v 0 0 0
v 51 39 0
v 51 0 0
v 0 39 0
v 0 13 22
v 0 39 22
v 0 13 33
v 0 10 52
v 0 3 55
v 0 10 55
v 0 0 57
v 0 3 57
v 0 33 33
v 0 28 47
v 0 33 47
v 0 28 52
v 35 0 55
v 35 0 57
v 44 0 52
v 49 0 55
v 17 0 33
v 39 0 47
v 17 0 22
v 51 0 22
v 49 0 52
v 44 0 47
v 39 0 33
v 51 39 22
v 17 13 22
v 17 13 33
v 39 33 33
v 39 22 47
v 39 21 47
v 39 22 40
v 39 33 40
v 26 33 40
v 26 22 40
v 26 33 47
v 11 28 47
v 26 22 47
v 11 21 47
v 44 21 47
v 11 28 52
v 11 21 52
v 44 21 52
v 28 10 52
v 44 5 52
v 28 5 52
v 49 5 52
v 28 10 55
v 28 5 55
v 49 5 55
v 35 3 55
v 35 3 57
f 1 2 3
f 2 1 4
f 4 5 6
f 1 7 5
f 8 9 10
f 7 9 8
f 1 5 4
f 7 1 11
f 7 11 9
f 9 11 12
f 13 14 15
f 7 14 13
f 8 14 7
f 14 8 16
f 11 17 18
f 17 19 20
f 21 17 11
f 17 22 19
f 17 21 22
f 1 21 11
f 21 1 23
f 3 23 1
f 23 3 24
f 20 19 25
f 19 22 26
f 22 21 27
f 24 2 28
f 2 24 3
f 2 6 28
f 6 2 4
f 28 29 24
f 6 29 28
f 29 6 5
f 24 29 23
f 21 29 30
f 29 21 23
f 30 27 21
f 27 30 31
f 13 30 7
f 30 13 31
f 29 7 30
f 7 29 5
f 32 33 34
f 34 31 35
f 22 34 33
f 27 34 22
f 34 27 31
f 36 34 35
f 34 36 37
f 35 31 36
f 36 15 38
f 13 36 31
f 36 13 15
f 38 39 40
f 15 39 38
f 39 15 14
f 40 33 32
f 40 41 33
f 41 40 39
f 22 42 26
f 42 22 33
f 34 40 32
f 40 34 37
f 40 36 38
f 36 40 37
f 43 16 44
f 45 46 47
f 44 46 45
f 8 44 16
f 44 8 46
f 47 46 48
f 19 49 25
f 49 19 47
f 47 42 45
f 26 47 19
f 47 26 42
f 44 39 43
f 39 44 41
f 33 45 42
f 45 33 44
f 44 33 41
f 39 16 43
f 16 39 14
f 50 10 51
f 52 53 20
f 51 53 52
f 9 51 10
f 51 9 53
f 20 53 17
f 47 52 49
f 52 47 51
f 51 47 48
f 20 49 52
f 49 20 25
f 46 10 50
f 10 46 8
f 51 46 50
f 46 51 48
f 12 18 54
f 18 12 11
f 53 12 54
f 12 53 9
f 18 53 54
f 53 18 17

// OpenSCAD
translate([8.5, 6.5, 5.5]) color([0.7181316517768294, 0.8070553799750758, 0.06635913103778524]) cube([17, 13, 11], center=true);
translate([25.5, 6.5, 5.5]) color([0.08464313683307012, 0.8688953140043785, 0.03941582937802879]) cube([17, 13, 11], center=true);
translate([42.5, 6.5, 5.5]) color([0.22509065367649606, 0.04063202664590093, 0.015285139969726802]) cube([17, 13, 11], center=true);
translate([8.5, 19.5, 5.5]) color([0.8439546856924078, 0.3305943672500803, 0.1606900602627206]) cube([17, 13, 11], center=true);
translate([25.5, 19.5, 5.5]) color([0.1488194902889095, 0.656083661770337, 0.9685982716927071]) cube([17, 13, 11], center=true);
translate([42.5, 19.5, 5.5]) color([0.5049996926056783, 0.9010904768840049, 0.5024285989524275]) cube([17, 13, 11], center=true);
translate([8.5, 32.5, 5.5]) color([0.5738724774915492, 0.6785713567893591, 0.805109989032137]) cube([17, 13, 11], center=true);
translate([25.5, 32.5, 5.5]) color([0.7578463822613826, 0.9905325627055622, 0.7469653891501328]) cube([17, 13, 11], center=true);
translate([42.5, 32.5, 5.5]) color([0.9057807233528663, 0.20610483206558328, 0.535416304328581]) cube([17, 13, 11], center=true);
translate([8.5, 6.5, 16.5]) color([0.5986142636674691, 0.8256966171603538, 0.4822135630659161]) cube([17, 13, 11], center=true);
translate([25.5, 6.5, 16.5]) color([0.7910402117090956, 0.3885688901501142, 0.5863884555814496]) cube([17, 13, 11], center=true);
translate([42.5, 6.5, 16.5]) color([0.8513166074810679, 0.7980594711041583, 0.6569845518861341]) cube([17, 13, 11], center=true);
translate([8.5, 19.5, 16.5]) color([0.00024069652516689466, 0.18196892218621108, 0.5068577868511277]) cube([17, 13, 11], center=true);
translate([25.5, 19.5, 16.5]) color([0.2544593984833793, 0.06562084327273077, 0.8598834221214616]) cube([17, 13, 11], center=true);
translate([42.5, 19.5, 16.5]) color([0.9429470213131631, 0.3028048781490337, 0.40807316738486077]) cube([17, 13, 11], center=true);
translate([8.5, 32.5, 16.5]) color([0.8100375338172869, 0.06225875887122312, 0.6409848625624502]) cube([17, 13, 11], center=true);
translate([25.5, 32.5, 16.5]) color([0.12732081293278708, 0.2870883399952252, 0.829940686628406]) cube([17, 13, 11], center=true);
translate([42.5, 32.5, 16.5]) color([0.0555270458896614, 0.035933833430188966, 0.4178660447962945]) cube([17, 13, 11], center=true);
translate([8.5, 6.5, 27.5]) color([0.49183095909626395, 0.8633251831082008, 0.7171887463451895]) cube([17, 13, 11], center=true);
translate([6.5, 5.5, 36.5]) color([0.6735438085995347, 0.15137377239978678, 0.9867059242186832]) cube([13, 11, 7], center=true);
translate([19.5, 5.5, 36.5]) color([0.41114019628748133, 0.6117708643248599, 0.38668300553323576]) cube([13, 11, 7], center=true);
translate([32.5, 5.5, 36.5]) color([0.04703291581184044, 0.4708892090480652, 0.15136775389483625]) cube([13, 11, 7], center=true);
translate([6.5, 16.5, 36.5]) color([0.03246546237394399, 0.6174004236810055, 0.6299662912183356]) cube([13, 11, 7], center=true);
translate([19.5, 16.5, 36.5]) color([0.10529282465636491, 0.5491437662317772, 0.3466679766399683]) cube([13, 11, 7], center=true);
translate([32.5, 16.5, 36.5]) color([0.3834140731648874, 0.7764198986996783, 0.49031967752424566]) cube([13, 11, 7], center=true);
translate([6.5, 27.5, 36.5]) color([0.8812766154122413, 0.6101197429062234, 0.4671884150380703]) cube([13, 11, 7], center=true);
translate([19.5, 27.5, 36.5]) color([0.6323126400553846, 0.3378653798287524, 0.12432379252825243]) cube([13, 11, 7], center=true);
translate([32.5, 27.5, 36.5]) color([0.6825296186925238, 0.622037442746657, 0.7885664913738635]) cube([13, 11, 7], center=true);
translate([6.5, 5.5, 43.5]) color([0.1271091249471088, 0.9117833181295222, 0.799341211421814]) cube([13, 11, 7], center=true);
translate([19.5, 5.5, 43.5]) color([0.9168874080910093, 0.8725347217734669, 0.681006446357057]) cube([13, 11, 7], center=true);
translate([32.5, 5.5, 43.5]) color([0.8102508494373589, 0.5190073092314018, 0.7854891493606652]) cube([13, 11, 7], center=true);
translate([6.5, 16.5, 43.5]) color([0.18912746785718504, 0.7821141063572942, 0.44457960405634067]) cube([13, 11, 7], center=true);
translate([19.5, 16.5, 43.5]) color([0.756616221297365, 0.4554702368121878, 0.7895587282777832]) cube([13, 11, 7], center=true);
translate([32.5, 16.5, 43.5]) color([0.07533958521856021, 0.04464090542441246, 0.9342895823715677]) cube([13, 11, 7], center=true);
translate([6.5, 27.5, 43.5]) color([0.4861651007487351, 0.9010713996489047, 0.9447832518820701]) cube([13, 11, 7], center=true);
translate([19.5, 27.5, 43.5]) color([0.6665111524556335, 0.5717968260934746, 0.21597938410680917]) cube([13, 11, 7], center=true);
translate([5.5, 3.5, 49.5]) color([0.09347621929900818, 0.8193942150822732, 0.8887720676319878]) cube([11, 7, 5], center=true);
translate([16.5, 3.5, 49.5]) color([0.7793957106948857, 0.6985024327316249, 0.42011111607482077]) cube([11, 7, 5], center=true);
translate([27.5, 3.5, 49.5]) color([0.3053115900269564, 0.11344489563770899, 0.425970248072163]) cube([11, 7, 5], center=true);
translate([38.5, 3.5, 49.5]) color([0.5660129742477574, 0.9228805831375125, 0.9357547693309531]) cube([11, 7, 5], center=true);
translate([5.5, 10.5, 49.5]) color([0.41564119654091314, 0.0992109880980957, 0.7738187324714434]) cube([11, 7, 5], center=true);
translate([16.5, 10.5, 49.5]) color([0.7342793416571158, 0.03070084595190614, 0.4467185991338365]) cube([11, 7, 5], center=true);
translate([27.5, 10.5, 49.5]) color([0.6864181042985581, 0.030134234552269934, 0.9192823534016137]) cube([11, 7, 5], center=true);
translate([38.5, 10.5, 49.5]) color([0.9622424865104192, 0.72254277208884, 0.0785385396518038]) cube([11, 7, 5], center=true);
translate([5.5, 17.5, 49.5]) color([0.07032946587635569, 0.3592533148212369, 0.029377507756986443]) cube([11, 7, 5], center=true);
translate([16.5, 17.5, 49.5]) color([0.3478777272843395, 0.009964241312966027, 0.9743235128409679]) cube([11, 7, 5], center=true);
translate([27.5, 17.5, 49.5]) color([0.8190066990688627, 0.07051761147818736, 0.8934350918478603]) cube([11, 7, 5], center=true);
translate([38.5, 17.5, 49.5]) color([0.20797804000401565, 0.20479079826934998, 0.6737591455288341]) cube([11, 7, 5], center=true);
translate([5.5, 24.5, 49.5]) color([0.9382622681625481, 0.12318812122923739, 0.007184567252270457]) cube([11, 7, 5], center=true);
translate([3.5, 2.5, 53.5]) color([0.3691301471700257, 0.024650014436155776, 0.6048482375805311]) cube([7, 5, 3], center=true);
translate([10.5, 2.5, 53.5]) color([0.8591756086192088, 0.1869917024228578, 0.11239103583018406]) cube([7, 5, 3], center=true);
translate([17.5, 2.5, 53.5]) color([0.34444960733861085, 0.9591715206073138, 0.13015769442868408]) cube([7, 5, 3], center=true);
translate([24.5, 2.5, 53.5]) color([0.9665192604669938, 0.36223986994484925, 0.47337040276011155]) cube([7, 5, 3], center=true);
translate([31.5, 2.5, 53.5]) color([0.29263198596497353, 0.9371268442154698, 0.9581478949874975]) cube([7, 5, 3], center=true);
translate([38.5, 2.5, 53.5]) color([0.6359157065077434, 0.18404555017515556, 0.9929517886102871]) cube([7, 5, 3], center=true);
translate([45.5, 2.5, 53.5]) color([0.10258043954691198, 0.5808493815940804, 0.15640306008300875]) cube([7, 5, 3], center=true);
translate([3.5, 7.5, 53.5]) color([0.8976753141502056, 0.9456783914956152, 0.8043902980001079]) cube([7, 5, 3], center=true);
translate([10.5, 7.5, 53.5]) color([0.3158914186681244, 0.2428386899579852, 0.7548584132190378]) cube([7, 5, 3], center=true);
translate([17.5, 7.5, 53.5]) color([0.291059519145354, 0.4197853778540753, 0.04625567690264132]) cube([7, 5, 3], center=true);
translate([24.5, 7.5, 53.5]) color([0.13223381043380655, 0.020549620641776678, 0.0779211200935358]) cube([7, 5, 3], center=true);
translate([2.5, 1.5, 56.0]) color([0.07321114936486084, 0.42023170217414685, 0.5507771776374378]) cube([5, 3, 2], center=true);
translate([7.5, 1.5, 56.0]) color([0.740878819870922, 0.14228347384241602, 0.4221887461694188]) cube([5, 3, 2], center=true);
translate([12.5, 1.5, 56.0]) color([0.6369660374117204, 0.08455569481893255, 0.44481115514620384]) cube([5, 3, 2], center=true);
translate([17.5, 1.5, 56.0]) color([0.3692560392397978, 0.9489319289416618, 0.05785711390101722]) cube([5, 3, 2], center=true);
translate([22.5, 1.5, 56.0]) color([0.40862622118314806, 0.41722547979620506, 0.728180504599678]) cube([5, 3, 2], center=true);
translate([27.5, 1.5, 56.0]) color([0.3206710028745039, 0.20399027594623398, 0.2933116551663051]) cube([5, 3, 2], center=true);
translate([32.5, 1.5, 56.0]) color([0.4708875424493587, 0.9502683295716211, 0.7965170227633064]) cube([5, 3, 2], center=true);
